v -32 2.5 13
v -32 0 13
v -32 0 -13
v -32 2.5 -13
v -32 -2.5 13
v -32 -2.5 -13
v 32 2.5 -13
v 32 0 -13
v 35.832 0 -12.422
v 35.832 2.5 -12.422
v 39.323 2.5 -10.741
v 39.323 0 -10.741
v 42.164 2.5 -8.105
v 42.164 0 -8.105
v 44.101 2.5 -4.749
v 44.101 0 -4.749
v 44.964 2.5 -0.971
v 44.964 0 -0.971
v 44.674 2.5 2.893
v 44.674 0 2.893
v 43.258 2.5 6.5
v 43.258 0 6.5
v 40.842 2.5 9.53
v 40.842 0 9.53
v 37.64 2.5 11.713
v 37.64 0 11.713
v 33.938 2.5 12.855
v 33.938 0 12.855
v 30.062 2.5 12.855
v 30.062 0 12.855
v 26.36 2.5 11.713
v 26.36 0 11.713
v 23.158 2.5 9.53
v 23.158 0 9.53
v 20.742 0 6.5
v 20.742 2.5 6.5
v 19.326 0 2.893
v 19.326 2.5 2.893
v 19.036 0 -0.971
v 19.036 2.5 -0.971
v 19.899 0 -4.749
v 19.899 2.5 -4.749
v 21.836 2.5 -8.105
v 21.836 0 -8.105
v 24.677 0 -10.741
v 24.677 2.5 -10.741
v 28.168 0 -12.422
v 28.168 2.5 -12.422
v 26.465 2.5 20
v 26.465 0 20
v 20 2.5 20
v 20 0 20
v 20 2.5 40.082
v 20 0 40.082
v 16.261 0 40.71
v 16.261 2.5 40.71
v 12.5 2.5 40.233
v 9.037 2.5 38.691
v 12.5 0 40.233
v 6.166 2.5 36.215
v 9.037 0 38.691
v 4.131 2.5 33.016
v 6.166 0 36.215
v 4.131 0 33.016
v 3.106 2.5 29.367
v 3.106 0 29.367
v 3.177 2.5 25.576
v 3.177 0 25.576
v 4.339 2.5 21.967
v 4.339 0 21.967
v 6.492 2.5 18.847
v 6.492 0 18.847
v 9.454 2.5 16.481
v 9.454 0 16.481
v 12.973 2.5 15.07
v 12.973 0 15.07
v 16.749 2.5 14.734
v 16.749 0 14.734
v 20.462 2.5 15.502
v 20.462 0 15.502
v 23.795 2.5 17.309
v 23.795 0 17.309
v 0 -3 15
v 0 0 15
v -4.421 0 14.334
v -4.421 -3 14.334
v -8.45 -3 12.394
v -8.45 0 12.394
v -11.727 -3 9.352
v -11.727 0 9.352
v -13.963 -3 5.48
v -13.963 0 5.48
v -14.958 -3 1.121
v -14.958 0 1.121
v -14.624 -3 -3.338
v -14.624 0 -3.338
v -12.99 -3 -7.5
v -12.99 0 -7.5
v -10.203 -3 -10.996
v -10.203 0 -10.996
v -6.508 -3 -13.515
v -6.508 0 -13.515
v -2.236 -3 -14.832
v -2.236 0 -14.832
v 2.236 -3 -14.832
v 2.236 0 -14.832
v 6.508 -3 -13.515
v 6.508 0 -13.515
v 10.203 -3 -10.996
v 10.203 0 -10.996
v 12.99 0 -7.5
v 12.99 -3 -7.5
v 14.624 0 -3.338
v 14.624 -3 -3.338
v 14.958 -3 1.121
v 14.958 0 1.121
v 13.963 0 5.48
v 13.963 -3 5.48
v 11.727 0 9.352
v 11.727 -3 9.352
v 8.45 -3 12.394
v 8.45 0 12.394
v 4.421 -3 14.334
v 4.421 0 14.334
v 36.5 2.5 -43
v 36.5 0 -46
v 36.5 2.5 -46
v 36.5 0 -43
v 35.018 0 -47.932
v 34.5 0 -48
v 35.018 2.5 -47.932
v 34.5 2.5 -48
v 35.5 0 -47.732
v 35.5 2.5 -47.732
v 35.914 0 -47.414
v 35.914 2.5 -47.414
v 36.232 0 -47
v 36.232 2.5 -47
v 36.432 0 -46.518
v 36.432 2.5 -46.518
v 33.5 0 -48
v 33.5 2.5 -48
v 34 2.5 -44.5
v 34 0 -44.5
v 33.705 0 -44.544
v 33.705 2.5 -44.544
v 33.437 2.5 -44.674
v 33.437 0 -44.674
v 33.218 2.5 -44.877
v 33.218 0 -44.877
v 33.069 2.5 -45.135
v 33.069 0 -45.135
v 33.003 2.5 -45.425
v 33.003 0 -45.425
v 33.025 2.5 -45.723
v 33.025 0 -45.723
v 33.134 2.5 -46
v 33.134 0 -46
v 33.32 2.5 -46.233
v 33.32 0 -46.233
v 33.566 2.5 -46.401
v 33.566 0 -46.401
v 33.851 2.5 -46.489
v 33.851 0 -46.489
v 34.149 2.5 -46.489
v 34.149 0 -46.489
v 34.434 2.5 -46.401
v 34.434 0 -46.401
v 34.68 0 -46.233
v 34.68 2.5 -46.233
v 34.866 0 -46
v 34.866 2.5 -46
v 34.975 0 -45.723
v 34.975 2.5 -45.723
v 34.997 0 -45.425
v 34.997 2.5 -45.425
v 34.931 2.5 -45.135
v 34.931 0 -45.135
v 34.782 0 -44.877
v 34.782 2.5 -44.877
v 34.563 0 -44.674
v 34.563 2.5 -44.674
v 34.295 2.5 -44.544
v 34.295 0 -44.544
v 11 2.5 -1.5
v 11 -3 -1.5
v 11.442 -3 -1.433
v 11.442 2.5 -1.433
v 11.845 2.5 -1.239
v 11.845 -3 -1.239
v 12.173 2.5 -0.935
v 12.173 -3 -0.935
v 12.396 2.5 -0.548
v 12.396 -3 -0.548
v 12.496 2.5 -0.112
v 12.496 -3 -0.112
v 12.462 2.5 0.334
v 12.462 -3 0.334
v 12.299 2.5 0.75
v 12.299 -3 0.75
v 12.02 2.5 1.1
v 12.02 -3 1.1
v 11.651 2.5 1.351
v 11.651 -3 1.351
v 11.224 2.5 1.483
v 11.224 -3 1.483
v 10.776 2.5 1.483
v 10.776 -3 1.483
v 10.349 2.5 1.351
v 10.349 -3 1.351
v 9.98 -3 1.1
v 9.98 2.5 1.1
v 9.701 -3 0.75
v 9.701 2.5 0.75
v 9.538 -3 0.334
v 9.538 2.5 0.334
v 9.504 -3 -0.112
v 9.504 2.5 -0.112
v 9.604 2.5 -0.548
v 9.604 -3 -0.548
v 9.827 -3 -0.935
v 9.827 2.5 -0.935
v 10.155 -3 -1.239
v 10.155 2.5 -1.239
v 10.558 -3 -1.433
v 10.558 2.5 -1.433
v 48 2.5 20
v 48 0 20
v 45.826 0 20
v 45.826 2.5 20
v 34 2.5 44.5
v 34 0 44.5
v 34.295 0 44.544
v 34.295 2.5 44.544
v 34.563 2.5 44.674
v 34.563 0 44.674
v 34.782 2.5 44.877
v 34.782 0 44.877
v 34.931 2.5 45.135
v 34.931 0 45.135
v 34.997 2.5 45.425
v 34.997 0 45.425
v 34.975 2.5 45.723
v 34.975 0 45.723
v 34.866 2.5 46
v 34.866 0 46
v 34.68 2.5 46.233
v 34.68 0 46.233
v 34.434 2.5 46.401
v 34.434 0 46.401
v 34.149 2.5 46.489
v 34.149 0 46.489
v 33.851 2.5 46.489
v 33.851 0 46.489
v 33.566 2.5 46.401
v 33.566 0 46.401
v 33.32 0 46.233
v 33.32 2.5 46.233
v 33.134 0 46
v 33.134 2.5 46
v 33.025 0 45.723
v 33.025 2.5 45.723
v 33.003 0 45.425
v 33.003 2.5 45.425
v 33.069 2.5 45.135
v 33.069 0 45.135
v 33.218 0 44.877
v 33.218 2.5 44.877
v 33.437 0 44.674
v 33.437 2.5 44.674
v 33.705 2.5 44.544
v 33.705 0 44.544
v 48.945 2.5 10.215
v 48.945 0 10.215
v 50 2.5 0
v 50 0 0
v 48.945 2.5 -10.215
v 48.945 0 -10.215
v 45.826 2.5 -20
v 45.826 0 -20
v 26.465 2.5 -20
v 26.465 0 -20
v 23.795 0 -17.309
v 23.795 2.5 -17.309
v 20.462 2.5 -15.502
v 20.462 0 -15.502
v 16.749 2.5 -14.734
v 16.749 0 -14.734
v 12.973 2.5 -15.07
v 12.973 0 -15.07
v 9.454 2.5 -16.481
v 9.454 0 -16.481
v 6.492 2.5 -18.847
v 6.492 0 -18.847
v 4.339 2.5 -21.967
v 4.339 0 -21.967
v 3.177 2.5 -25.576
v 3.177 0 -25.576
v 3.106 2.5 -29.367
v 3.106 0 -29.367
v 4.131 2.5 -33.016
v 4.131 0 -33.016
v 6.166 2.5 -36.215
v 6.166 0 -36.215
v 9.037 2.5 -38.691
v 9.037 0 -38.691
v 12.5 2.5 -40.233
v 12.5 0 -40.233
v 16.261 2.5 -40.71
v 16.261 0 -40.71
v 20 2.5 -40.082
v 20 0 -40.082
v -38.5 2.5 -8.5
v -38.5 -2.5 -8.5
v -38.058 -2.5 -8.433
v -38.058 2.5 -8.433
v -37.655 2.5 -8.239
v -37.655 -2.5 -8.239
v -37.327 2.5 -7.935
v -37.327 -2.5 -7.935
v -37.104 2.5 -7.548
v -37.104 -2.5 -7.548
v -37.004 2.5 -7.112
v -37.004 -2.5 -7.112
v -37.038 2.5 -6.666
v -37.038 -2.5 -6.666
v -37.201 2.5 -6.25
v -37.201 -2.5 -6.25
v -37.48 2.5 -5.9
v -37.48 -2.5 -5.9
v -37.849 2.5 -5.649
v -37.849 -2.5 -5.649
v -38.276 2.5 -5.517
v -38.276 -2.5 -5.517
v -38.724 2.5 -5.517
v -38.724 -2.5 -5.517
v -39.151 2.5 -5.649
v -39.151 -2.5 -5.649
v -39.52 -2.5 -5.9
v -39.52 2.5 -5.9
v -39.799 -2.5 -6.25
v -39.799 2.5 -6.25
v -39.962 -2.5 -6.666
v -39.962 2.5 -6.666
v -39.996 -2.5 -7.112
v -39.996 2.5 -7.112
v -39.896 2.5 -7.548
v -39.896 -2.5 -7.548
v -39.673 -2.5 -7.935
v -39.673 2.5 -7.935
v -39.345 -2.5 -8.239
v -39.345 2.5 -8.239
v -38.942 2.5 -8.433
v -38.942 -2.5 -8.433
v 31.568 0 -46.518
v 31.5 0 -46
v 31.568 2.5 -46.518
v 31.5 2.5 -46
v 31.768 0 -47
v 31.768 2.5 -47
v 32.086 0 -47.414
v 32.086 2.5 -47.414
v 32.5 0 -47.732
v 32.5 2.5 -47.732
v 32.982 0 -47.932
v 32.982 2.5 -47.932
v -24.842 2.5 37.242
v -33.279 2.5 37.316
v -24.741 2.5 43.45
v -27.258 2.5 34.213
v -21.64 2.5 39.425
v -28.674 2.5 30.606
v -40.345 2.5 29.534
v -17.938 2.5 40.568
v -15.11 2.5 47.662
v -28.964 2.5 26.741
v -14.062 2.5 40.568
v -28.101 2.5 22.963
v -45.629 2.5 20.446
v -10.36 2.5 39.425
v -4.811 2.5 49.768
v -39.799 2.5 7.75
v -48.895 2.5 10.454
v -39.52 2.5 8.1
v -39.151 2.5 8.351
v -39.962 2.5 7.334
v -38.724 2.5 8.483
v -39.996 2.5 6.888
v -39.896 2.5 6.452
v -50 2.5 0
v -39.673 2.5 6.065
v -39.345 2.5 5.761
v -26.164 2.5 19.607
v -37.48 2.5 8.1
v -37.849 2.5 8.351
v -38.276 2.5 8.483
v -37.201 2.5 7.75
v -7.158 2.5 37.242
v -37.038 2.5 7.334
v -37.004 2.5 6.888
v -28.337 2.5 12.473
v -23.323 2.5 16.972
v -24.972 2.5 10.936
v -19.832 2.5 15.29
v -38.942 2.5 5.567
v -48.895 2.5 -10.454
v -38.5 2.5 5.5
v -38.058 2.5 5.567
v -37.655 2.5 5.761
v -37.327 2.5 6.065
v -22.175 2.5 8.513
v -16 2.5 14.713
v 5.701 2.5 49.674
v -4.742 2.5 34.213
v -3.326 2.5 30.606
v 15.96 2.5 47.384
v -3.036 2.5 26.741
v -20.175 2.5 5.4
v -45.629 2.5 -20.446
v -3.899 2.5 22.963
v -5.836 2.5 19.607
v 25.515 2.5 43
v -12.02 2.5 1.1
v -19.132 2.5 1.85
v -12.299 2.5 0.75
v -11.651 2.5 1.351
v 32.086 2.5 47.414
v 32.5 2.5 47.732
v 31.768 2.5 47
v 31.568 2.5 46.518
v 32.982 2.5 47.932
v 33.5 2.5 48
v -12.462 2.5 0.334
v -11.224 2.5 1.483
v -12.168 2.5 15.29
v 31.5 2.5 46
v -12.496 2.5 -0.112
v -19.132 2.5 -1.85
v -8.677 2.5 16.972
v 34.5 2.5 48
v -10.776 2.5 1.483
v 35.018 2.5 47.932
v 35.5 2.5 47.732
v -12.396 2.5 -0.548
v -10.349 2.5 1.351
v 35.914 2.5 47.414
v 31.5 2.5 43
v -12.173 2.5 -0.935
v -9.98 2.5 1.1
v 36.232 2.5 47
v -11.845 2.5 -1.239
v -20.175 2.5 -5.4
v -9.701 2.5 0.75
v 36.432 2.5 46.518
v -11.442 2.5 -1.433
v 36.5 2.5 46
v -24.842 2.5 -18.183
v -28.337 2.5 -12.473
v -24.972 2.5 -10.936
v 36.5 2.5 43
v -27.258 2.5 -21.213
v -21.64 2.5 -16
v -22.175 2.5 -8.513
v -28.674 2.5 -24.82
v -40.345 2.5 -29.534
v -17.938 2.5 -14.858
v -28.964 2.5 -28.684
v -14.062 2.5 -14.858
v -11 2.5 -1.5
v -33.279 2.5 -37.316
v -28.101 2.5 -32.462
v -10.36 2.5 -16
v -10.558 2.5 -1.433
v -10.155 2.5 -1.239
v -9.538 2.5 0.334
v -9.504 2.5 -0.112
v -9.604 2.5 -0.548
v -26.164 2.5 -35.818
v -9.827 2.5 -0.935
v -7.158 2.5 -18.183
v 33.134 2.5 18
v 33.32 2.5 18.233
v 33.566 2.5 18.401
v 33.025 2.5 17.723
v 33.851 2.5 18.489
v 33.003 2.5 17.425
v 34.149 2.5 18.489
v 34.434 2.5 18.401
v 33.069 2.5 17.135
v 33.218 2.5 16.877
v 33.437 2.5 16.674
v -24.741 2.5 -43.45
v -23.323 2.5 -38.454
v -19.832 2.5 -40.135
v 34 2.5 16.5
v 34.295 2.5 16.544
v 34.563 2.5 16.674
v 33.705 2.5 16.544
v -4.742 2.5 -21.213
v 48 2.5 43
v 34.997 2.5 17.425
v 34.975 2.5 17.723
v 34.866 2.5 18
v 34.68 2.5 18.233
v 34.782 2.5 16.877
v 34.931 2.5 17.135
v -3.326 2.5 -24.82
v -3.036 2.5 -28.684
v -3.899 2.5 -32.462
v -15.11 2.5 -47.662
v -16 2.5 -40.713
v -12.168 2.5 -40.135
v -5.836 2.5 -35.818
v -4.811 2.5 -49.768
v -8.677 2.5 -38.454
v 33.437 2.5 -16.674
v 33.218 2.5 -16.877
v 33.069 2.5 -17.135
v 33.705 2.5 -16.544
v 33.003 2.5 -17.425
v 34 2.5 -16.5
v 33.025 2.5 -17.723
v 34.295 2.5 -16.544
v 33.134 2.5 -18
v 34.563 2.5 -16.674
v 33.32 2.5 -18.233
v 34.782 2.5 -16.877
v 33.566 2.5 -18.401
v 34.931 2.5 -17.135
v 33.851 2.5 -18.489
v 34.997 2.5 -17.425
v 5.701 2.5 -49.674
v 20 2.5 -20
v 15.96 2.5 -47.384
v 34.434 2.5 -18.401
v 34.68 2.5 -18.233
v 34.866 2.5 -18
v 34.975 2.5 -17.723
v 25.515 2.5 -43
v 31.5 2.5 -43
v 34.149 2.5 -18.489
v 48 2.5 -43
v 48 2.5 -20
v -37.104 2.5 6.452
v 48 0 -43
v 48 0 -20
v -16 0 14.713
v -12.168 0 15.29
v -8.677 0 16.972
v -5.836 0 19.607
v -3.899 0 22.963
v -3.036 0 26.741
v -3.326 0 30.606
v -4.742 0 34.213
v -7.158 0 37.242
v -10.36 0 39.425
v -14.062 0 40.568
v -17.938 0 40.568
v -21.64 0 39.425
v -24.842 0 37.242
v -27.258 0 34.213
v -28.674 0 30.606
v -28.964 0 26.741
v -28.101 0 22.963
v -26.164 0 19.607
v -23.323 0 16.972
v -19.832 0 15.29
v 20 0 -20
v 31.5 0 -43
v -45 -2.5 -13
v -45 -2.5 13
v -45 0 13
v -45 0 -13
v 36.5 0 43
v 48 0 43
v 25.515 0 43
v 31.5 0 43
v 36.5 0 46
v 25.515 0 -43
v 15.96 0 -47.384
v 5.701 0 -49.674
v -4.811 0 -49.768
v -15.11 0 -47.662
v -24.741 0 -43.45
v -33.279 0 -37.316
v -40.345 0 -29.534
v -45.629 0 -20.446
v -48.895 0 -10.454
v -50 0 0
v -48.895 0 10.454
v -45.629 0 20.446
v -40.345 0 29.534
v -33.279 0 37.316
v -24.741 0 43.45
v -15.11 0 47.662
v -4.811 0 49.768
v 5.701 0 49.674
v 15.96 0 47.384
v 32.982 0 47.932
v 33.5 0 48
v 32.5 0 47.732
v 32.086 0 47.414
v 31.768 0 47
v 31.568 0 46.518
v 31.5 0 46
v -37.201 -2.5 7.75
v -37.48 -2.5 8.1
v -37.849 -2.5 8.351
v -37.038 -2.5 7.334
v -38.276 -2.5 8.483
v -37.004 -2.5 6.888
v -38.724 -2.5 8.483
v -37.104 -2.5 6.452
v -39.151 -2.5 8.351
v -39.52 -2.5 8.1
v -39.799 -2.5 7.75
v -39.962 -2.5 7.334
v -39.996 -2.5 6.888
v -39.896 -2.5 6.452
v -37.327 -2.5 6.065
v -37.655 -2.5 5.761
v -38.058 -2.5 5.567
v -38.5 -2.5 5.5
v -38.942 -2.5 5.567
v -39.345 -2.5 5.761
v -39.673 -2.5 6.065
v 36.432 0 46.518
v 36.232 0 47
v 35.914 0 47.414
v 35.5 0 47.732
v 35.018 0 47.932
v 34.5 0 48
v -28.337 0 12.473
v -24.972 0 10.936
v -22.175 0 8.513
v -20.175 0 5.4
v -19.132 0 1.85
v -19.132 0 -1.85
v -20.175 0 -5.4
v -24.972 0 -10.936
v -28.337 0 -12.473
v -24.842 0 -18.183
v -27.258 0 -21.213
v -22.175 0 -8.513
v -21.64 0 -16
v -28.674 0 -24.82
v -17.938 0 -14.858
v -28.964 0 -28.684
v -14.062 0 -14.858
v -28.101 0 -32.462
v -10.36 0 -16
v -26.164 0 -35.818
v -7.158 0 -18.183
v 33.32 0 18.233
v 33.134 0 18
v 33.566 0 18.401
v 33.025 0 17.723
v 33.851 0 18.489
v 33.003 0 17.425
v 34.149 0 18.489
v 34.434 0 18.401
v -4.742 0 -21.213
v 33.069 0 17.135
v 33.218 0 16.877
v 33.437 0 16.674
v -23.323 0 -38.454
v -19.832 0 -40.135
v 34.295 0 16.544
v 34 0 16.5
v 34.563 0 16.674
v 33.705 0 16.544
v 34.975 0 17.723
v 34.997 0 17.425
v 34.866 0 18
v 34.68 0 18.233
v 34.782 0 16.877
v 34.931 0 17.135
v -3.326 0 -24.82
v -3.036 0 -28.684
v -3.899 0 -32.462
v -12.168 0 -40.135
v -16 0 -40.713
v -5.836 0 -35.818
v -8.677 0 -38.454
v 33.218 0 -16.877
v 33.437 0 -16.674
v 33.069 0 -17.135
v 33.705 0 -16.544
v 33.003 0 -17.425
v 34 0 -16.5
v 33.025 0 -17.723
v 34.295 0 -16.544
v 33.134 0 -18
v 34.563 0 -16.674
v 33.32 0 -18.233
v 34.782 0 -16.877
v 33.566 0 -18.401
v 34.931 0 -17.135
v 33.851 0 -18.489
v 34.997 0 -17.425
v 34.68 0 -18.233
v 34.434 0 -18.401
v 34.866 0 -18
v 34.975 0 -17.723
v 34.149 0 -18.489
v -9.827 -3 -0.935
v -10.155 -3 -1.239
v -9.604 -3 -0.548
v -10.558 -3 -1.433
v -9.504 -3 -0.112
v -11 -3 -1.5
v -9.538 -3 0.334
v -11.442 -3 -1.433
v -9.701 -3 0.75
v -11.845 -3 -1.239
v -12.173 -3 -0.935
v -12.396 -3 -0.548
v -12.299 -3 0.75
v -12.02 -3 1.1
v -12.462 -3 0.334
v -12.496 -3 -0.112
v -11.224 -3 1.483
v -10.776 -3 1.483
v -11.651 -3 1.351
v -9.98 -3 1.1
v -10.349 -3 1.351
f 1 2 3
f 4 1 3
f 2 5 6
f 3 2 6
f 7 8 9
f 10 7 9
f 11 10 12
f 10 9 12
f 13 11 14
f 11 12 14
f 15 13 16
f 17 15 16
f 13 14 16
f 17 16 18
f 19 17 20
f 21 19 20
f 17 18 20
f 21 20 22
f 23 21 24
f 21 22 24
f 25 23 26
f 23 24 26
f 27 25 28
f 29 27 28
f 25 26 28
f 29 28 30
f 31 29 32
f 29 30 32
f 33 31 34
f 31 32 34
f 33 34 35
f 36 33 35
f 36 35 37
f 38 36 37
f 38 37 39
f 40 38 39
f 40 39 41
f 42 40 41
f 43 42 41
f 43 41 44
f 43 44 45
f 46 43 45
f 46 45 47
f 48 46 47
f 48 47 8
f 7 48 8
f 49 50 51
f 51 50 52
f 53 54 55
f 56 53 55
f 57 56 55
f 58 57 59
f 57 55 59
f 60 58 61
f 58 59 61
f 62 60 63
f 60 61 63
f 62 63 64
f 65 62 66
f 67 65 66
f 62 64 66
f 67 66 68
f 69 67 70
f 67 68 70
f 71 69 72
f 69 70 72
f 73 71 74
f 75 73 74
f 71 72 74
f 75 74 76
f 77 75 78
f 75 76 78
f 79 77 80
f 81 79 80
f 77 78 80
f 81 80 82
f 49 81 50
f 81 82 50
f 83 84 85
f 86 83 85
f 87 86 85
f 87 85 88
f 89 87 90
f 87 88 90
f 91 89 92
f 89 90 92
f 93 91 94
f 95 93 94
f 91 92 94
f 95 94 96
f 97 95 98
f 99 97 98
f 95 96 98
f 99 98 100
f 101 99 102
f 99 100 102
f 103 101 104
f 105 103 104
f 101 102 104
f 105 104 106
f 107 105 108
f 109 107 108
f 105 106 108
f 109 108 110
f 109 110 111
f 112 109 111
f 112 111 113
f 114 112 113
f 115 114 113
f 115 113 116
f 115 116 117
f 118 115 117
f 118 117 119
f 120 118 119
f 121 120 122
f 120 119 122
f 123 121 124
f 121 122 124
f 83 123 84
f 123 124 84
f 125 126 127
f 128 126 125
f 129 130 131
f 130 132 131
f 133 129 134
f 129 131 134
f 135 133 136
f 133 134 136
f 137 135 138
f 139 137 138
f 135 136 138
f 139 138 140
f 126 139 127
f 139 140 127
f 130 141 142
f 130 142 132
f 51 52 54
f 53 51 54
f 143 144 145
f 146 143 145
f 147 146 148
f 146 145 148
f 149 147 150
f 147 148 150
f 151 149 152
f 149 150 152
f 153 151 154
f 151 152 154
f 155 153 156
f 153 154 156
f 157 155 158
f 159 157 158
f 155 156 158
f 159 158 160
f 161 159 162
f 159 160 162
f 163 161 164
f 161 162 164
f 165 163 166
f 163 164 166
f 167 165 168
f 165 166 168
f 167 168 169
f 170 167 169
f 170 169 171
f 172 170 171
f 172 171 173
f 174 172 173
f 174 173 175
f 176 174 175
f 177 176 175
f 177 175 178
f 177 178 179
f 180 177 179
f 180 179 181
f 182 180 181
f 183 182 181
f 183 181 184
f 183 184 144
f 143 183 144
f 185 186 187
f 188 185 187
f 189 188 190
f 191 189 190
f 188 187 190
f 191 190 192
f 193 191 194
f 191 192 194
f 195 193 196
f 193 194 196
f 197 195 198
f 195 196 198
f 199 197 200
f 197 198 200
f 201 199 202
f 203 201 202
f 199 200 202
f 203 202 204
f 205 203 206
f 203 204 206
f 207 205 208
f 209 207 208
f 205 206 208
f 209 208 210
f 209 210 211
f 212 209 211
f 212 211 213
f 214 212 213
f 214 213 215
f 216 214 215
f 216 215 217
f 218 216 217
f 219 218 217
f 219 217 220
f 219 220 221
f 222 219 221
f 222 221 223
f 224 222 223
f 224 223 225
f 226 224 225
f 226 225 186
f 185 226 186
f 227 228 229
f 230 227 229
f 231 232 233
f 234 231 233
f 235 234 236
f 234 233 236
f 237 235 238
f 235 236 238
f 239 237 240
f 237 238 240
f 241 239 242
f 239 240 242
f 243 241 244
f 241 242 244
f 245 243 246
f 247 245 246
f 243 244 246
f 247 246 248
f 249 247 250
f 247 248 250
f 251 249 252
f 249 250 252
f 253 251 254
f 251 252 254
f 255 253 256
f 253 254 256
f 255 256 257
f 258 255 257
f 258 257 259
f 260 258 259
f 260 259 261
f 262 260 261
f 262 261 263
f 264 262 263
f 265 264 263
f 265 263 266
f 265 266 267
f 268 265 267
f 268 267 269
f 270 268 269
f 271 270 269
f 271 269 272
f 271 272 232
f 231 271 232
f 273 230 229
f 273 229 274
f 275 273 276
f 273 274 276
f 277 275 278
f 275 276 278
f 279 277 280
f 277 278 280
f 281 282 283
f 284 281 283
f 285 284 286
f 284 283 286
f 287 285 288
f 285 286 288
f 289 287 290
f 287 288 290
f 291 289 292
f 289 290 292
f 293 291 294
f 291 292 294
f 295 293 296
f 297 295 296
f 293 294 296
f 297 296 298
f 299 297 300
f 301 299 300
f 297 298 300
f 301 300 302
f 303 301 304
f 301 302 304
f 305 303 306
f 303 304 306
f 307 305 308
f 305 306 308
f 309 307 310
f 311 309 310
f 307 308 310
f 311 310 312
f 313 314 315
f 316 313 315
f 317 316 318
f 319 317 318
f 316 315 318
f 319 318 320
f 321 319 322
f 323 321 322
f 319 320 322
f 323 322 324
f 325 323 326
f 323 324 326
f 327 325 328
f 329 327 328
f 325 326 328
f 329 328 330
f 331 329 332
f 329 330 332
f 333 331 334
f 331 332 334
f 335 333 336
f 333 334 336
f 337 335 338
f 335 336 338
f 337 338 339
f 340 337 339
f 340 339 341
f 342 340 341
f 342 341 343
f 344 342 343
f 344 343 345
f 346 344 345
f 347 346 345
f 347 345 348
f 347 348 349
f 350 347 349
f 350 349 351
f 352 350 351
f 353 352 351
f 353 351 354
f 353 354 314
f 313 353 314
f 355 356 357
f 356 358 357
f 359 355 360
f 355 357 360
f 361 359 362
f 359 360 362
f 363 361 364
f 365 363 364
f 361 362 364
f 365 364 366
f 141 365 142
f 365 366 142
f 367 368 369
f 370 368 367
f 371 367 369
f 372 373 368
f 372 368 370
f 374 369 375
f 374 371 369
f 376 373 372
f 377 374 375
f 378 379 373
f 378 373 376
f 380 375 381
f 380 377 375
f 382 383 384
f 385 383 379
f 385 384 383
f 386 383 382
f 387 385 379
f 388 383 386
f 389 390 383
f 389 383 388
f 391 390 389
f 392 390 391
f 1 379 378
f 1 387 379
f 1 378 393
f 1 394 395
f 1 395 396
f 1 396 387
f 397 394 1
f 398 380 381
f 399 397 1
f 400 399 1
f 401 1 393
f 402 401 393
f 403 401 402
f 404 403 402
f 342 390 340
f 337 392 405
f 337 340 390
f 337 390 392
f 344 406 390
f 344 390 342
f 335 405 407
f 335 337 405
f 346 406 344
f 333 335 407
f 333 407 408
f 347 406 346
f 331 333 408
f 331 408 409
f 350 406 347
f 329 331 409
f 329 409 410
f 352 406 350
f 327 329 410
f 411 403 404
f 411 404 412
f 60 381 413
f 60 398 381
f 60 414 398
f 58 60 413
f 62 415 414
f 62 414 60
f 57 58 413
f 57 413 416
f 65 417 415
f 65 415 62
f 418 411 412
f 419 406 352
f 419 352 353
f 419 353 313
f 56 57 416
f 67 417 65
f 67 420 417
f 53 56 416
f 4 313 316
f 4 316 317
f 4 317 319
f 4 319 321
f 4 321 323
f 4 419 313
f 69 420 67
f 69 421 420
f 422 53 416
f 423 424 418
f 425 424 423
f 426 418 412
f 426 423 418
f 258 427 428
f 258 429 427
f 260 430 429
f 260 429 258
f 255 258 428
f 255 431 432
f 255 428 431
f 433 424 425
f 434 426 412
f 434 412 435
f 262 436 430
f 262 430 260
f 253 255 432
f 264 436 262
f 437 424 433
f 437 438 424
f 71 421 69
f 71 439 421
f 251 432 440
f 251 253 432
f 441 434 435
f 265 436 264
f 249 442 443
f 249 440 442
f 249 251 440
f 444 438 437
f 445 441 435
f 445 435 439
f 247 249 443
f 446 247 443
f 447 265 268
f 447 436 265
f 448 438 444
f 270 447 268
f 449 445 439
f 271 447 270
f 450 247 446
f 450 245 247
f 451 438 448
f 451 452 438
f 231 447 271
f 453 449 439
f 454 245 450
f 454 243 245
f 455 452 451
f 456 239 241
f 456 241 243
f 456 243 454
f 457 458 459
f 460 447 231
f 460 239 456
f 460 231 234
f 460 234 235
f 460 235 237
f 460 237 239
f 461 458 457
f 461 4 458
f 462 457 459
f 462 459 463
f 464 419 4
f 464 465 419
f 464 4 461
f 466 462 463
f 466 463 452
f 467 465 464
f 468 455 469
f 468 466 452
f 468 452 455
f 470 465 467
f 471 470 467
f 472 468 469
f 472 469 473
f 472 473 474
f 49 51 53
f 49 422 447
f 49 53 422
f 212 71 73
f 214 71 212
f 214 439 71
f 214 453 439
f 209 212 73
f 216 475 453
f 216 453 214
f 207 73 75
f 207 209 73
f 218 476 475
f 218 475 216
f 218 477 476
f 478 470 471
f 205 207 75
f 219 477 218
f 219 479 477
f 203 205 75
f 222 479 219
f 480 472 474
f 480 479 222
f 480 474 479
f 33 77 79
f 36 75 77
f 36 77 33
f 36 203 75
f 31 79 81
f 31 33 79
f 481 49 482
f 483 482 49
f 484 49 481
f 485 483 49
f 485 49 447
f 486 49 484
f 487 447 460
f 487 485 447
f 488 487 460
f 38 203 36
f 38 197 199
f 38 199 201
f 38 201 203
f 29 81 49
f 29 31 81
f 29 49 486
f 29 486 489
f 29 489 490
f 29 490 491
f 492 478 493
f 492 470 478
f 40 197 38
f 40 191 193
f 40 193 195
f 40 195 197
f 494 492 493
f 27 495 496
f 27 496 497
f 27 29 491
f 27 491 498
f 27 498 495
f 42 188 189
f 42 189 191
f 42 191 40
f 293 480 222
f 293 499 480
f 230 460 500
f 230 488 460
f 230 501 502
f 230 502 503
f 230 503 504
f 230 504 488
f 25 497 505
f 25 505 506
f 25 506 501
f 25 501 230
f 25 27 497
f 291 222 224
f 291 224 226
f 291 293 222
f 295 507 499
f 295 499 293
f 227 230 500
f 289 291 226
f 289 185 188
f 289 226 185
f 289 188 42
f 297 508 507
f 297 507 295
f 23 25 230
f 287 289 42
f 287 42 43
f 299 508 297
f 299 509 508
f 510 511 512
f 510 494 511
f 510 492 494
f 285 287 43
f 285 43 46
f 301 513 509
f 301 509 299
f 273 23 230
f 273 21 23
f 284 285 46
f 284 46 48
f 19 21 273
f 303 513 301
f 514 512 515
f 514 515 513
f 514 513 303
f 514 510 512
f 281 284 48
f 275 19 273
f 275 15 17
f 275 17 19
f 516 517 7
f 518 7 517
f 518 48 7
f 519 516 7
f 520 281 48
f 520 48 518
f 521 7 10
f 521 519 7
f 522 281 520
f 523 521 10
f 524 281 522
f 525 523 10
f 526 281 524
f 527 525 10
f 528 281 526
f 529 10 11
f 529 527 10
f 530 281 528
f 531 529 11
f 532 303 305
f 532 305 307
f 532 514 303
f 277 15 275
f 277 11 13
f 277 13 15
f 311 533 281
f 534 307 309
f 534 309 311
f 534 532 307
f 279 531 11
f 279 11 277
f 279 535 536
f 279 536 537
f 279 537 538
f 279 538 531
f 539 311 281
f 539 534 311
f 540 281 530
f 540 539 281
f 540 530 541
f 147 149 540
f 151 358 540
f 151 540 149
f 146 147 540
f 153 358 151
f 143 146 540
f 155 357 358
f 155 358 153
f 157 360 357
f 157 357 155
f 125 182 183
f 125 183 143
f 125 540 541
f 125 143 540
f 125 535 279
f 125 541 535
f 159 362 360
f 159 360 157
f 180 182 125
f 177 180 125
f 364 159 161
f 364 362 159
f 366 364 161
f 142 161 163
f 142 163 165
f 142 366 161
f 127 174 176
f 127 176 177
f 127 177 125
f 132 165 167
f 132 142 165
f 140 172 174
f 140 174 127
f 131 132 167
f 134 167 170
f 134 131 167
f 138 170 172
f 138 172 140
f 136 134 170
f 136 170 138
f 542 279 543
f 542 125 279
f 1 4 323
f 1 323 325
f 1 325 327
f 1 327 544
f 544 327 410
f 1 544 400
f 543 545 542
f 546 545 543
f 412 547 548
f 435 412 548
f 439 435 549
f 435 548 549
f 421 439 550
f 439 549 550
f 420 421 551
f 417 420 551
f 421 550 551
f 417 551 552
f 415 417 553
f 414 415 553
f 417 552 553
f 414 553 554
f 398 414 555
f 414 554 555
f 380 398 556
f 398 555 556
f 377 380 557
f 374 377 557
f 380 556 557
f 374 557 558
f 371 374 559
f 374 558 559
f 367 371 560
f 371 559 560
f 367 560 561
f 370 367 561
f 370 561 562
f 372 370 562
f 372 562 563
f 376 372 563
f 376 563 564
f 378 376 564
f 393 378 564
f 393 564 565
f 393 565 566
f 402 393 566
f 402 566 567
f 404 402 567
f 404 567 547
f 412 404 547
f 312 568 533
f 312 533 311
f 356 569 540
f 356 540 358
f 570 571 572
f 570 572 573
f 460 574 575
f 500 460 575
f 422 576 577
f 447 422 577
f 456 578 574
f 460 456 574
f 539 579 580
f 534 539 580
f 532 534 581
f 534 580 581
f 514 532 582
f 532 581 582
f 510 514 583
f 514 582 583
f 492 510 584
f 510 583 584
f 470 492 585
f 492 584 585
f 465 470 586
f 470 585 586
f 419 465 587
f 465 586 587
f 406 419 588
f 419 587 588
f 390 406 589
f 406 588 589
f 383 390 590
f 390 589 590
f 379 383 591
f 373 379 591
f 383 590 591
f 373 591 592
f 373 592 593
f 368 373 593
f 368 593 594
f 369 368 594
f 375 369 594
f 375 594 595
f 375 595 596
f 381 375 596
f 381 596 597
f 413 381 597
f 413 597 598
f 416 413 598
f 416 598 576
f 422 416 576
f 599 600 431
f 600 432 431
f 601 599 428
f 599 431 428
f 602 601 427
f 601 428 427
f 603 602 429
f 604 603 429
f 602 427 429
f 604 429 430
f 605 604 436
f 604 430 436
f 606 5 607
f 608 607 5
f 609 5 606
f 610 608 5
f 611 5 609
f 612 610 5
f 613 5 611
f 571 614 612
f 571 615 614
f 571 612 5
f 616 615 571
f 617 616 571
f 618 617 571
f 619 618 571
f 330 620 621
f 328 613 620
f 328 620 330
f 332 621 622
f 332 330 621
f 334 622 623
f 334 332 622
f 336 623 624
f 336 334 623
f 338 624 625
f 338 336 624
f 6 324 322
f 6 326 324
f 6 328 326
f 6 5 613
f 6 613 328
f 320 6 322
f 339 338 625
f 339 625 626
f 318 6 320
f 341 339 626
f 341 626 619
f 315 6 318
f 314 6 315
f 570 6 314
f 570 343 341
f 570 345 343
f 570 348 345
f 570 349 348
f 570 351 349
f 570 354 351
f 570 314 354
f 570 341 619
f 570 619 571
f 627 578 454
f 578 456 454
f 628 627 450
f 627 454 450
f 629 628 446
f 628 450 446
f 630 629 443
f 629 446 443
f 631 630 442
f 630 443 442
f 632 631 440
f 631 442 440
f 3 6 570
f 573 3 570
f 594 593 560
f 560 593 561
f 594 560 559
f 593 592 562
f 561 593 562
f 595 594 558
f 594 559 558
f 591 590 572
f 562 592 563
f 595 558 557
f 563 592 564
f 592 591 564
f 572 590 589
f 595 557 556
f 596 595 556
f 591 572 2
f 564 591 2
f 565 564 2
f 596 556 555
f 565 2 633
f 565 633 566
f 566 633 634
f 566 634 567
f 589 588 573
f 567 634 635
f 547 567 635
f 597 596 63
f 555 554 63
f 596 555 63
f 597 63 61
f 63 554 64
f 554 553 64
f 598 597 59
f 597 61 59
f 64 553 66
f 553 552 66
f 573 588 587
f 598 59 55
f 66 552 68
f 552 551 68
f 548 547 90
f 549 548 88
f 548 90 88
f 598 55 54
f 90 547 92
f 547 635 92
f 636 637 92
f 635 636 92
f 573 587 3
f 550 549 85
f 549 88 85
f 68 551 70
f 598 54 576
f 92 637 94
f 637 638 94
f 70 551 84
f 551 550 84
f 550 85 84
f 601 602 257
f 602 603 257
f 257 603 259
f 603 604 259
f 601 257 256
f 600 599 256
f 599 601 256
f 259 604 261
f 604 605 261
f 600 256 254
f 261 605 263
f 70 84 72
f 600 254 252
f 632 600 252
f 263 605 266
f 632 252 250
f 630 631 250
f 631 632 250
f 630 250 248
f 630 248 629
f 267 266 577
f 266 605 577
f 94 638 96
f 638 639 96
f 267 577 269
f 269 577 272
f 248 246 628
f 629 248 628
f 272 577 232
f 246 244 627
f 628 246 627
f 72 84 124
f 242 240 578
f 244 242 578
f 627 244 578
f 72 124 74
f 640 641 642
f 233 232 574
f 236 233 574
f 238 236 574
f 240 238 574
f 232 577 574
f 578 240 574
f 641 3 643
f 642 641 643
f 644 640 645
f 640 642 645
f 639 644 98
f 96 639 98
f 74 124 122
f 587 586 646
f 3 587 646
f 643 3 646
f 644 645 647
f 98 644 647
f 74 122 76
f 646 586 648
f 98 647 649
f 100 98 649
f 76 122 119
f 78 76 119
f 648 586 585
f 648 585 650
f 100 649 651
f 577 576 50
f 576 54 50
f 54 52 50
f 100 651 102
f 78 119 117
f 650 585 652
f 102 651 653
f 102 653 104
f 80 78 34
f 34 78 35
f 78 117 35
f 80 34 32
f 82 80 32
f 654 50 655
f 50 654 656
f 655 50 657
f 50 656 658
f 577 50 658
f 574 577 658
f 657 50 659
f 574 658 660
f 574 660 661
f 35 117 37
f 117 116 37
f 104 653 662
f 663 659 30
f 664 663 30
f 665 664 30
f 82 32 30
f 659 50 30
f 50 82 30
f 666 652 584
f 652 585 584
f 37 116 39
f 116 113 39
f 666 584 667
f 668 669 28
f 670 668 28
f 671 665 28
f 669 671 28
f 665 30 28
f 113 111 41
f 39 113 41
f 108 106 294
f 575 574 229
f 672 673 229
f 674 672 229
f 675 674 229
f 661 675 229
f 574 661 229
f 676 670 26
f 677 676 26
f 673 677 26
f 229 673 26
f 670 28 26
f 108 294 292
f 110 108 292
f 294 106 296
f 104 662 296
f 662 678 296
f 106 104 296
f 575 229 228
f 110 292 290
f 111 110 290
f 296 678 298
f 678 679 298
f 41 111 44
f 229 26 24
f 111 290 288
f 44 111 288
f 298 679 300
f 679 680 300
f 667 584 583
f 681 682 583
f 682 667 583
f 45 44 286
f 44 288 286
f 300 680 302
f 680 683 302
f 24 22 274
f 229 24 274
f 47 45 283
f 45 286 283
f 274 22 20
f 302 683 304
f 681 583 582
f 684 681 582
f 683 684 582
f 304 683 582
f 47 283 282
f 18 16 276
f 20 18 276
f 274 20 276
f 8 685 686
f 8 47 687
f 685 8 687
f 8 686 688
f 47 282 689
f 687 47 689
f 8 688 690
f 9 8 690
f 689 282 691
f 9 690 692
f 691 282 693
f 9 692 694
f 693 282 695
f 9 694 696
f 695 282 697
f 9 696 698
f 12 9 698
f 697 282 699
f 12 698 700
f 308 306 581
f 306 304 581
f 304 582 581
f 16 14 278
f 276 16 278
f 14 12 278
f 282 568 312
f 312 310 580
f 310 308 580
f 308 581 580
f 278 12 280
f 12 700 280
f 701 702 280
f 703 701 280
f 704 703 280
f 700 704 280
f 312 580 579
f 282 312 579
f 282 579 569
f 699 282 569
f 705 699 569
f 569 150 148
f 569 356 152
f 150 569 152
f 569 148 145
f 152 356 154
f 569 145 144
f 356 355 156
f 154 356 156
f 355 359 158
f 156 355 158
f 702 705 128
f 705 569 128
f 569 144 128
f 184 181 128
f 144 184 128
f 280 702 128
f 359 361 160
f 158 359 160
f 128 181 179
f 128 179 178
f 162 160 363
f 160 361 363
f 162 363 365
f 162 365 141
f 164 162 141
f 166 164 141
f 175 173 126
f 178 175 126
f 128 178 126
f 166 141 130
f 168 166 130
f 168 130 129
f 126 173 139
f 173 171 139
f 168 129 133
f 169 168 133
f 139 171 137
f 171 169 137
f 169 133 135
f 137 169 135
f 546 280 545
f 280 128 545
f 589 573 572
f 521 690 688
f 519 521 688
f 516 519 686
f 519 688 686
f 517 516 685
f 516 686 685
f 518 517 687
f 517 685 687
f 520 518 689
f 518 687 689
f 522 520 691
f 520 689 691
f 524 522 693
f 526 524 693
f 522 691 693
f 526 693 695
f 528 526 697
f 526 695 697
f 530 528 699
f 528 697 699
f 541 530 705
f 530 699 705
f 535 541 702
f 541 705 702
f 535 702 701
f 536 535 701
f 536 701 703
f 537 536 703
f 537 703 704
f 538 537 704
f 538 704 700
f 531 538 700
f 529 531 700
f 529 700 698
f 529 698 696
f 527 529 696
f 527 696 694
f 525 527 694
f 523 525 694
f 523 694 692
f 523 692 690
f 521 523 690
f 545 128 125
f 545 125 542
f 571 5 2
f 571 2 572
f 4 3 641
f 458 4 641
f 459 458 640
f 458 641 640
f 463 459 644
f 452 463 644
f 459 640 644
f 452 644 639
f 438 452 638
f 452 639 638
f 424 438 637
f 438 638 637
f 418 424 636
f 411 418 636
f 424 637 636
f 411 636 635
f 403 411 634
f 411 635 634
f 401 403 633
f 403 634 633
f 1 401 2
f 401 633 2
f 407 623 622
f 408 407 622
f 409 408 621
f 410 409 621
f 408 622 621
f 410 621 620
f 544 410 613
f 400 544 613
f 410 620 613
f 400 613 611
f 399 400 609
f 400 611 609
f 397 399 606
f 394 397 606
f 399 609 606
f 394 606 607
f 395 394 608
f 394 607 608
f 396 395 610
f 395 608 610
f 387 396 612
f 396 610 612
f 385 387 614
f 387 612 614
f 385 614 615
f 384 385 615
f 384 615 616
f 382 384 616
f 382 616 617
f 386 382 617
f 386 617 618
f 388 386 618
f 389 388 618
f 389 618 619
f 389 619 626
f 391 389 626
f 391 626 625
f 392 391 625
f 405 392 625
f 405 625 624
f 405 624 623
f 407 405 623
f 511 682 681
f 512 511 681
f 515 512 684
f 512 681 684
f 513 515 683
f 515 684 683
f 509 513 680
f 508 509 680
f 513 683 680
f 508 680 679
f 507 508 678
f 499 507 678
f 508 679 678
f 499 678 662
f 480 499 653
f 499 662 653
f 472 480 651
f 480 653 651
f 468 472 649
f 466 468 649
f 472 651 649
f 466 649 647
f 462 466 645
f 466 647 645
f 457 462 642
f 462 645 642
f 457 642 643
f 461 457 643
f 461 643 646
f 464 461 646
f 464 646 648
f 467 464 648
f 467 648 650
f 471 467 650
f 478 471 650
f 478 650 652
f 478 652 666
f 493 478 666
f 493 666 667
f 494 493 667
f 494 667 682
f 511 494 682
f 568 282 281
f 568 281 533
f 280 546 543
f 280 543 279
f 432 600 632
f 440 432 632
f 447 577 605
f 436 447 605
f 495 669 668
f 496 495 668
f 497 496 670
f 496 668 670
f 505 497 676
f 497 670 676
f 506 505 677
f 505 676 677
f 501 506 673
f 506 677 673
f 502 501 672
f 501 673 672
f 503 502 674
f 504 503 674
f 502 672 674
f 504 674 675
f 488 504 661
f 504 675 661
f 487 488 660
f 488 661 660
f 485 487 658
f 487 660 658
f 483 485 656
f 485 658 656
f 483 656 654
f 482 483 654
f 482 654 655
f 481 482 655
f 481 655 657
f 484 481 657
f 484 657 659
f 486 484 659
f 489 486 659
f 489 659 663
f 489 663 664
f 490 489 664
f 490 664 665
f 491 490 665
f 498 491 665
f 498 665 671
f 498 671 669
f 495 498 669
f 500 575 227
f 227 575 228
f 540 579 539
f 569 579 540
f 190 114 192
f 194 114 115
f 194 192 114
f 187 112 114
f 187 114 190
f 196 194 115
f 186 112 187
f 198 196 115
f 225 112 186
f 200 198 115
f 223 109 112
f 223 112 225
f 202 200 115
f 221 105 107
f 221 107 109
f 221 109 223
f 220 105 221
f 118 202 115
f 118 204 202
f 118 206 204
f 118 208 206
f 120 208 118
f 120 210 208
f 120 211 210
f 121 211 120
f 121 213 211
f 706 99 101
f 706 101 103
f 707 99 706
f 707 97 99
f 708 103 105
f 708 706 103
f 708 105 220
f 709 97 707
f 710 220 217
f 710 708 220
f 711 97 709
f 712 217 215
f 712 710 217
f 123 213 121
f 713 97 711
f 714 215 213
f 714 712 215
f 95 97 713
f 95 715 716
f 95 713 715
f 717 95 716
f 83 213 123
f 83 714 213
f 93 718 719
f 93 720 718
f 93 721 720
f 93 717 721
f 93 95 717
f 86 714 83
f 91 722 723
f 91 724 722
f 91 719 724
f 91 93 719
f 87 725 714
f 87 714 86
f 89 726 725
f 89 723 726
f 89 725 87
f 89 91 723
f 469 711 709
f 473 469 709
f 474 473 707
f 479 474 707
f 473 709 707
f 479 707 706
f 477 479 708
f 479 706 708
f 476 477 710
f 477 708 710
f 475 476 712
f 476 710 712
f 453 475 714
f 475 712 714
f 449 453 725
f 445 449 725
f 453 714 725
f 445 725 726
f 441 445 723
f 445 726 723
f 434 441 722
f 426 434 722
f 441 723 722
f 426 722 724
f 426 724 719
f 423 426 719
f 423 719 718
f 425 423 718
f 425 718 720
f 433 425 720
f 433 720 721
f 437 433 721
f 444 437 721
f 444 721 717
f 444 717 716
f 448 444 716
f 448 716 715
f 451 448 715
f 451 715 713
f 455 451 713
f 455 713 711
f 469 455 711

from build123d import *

# Parameters (mm, degrees)
SKETCH_1_R          = 50
EXTRUDE_1_DEPTH     = 2.5
SKETCH_2_R          = 15
EXTRUDE_2_DEPTH     = 3
SKETCH_3_R          = 1.5
CUT_EXTRUDE_1_DEPTH = 71.924255371
SKETCH_5_R          = 13
CUT_EXTRUDE_3_DEPTH = 71.774289117
SKETCH_6_W          = 13
SKETCH_6_H          = 26
EXTRUDE_3_DEPTH     = 2.5
SKETCH_8_R          = 1.5
CUT_EXTRUDE_4_DEPTH = 71.887234394
EXTRUDE_4_DEPTH     = 2.5
SKETCH_11_R         = 1
CUT_EXTRUDE_5_DEPTH = 71.774289117
FILLET_1_R          = 2


with BuildPart() as part:
    # 草图1 → 凸台-拉伸1 (new body)
    with BuildSketch(Plane(origin=(0, 0, 0), x_dir=(1, 0, 0), z_dir=(0, 1, 0))):
        with Locations(Location((0, 0, 0), (0, 0, 270))):
            Circle(SKETCH_1_R)
    extrude(amount=EXTRUDE_1_DEPTH)

    # 草图2 → 凸台-拉伸2 (add)
    with BuildSketch(Plane(origin=(0, 0, 0), x_dir=(-1, 0, 0), z_dir=(0, -1, 0))):
        with Locations(Location((0, 0, 0), (0, 0, 270))):
            Circle(SKETCH_2_R)
    extrude(amount=EXTRUDE_2_DEPTH)

    # 草图3 → 切除-拉伸1 (cut, through all)
    with BuildSketch(Plane(origin=(0, -3, 0), x_dir=(-1, 0, 0), z_dir=(0, -1, 0))):
        with Locations(Location((11, 0, 0), (0, 0, 90))):
            Circle(SKETCH_3_R)
        with Locations(Location((-11, 0, 0), (0, 0, 90))):
            Circle(SKETCH_3_R)
    extrude(amount=-CUT_EXTRUDE_1_DEPTH, mode=Mode.SUBTRACT)

    # 草图5 → 切除-拉伸3 (cut, through all)
    with BuildSketch(Plane(origin=(0, 0, 0), x_dir=(-1, 0, 0), z_dir=(0, -1, 0))):
        with Locations(Location((32, 0, 0), (0, 0, 90))):
            Circle(SKETCH_5_R)
        with Locations(Location((16, -27.712812921, 0), (0, 0, 90))):
            Circle(SKETCH_5_R)
        with Locations(Location((-16, -27.712812921, 0), (0, 0, 90))):
            Circle(SKETCH_5_R)
        with Locations(Location((-32, 0, 0), (0, 0, 90))):
            Circle(SKETCH_5_R)
        with Locations(Location((-16, 27.712812921, 0), (0, 0, 90))):
            Circle(SKETCH_5_R)
        with Locations(Location((16, 27.712812921, 0), (0, 0, 90))):
            Circle(SKETCH_5_R)
    extrude(amount=-CUT_EXTRUDE_3_DEPTH, mode=Mode.SUBTRACT)

    # 草图6 → 凸台-拉伸3 (add, symmetric)
    with BuildSketch(Plane(origin=(0, 0, 0), x_dir=(-1, 0, 0), z_dir=(0, -1, 0))):
        with Locations((38.5, 0)):
            Rectangle(SKETCH_6_W, SKETCH_6_H)
    extrude(amount=EXTRUDE_3_DEPTH, both=True)

    # 草图8 → 切除-拉伸4 (cut, through all)
    with BuildSketch(Plane(origin=(0, -2.5, 0), x_dir=(-1, 0, 0), z_dir=(0, -1, 0))):
        with Locations(Location((38.5, -7, 0), (0, 0, 90))):
            Circle(SKETCH_8_R)
        with Locations(Location((38.5, 7, 0), (0, 0, 90))):
            Circle(SKETCH_8_R)
    extrude(amount=-CUT_EXTRUDE_4_DEPTH, mode=Mode.SUBTRACT)

    # 草图9 → 凸台-拉伸4 (add)
    with BuildSketch(Plane(origin=(0, 0, 0), x_dir=(-1, 0, 0), z_dir=(0, -1, 0))):
        Polygon((-36.5, -43), (-48, -43), (-48, -20), (-20, -20), (-20, -43), (-31.5, -43), (-31.5, -48), (-36.5, -48), align=None)
        Polygon((-31.5, 43), (-31.5, 48), (-36.5, 48), (-36.5, 43), (-48, 43), (-48, 20), (-20, 20), (-20, 43), align=None)
    extrude(amount=-EXTRUDE_4_DEPTH)

    # 草图11 → 切除-拉伸5 (cut, through all)
    with BuildSketch(Plane(origin=(0, 0, 0), x_dir=(-1, 0, 0), z_dir=(0, -1, 0))):
        with Locations(Location((-34, -45.5, 0), (0, 0, 90))):
            Circle(SKETCH_11_R)
        with Locations(Location((-34, -17.5, 0), (0, 0, 90))):
            Circle(SKETCH_11_R)
        with Locations(Location((-34, 17.5, 0), (0, 0, 270))):
            Circle(SKETCH_11_R)
        with Locations(Location((-34, 45.5, 0), (0, 0, 270))):
            Circle(SKETCH_11_R)
    extrude(amount=-CUT_EXTRUDE_5_DEPTH, mode=Mode.SUBTRACT)

    # 圆角1
    fillet_1_edges = [part.edges().sort_by_distance(p)[0] for p in [
        (36.5, 1.25, -48),
        (31.5, 1.25, -48),
        (31.5, 1.25, 48),
        (36.5, 1.25, 48),
    ]]
    fillet(fillet_1_edges, radius=FILLET_1_R)


solid = part.part
